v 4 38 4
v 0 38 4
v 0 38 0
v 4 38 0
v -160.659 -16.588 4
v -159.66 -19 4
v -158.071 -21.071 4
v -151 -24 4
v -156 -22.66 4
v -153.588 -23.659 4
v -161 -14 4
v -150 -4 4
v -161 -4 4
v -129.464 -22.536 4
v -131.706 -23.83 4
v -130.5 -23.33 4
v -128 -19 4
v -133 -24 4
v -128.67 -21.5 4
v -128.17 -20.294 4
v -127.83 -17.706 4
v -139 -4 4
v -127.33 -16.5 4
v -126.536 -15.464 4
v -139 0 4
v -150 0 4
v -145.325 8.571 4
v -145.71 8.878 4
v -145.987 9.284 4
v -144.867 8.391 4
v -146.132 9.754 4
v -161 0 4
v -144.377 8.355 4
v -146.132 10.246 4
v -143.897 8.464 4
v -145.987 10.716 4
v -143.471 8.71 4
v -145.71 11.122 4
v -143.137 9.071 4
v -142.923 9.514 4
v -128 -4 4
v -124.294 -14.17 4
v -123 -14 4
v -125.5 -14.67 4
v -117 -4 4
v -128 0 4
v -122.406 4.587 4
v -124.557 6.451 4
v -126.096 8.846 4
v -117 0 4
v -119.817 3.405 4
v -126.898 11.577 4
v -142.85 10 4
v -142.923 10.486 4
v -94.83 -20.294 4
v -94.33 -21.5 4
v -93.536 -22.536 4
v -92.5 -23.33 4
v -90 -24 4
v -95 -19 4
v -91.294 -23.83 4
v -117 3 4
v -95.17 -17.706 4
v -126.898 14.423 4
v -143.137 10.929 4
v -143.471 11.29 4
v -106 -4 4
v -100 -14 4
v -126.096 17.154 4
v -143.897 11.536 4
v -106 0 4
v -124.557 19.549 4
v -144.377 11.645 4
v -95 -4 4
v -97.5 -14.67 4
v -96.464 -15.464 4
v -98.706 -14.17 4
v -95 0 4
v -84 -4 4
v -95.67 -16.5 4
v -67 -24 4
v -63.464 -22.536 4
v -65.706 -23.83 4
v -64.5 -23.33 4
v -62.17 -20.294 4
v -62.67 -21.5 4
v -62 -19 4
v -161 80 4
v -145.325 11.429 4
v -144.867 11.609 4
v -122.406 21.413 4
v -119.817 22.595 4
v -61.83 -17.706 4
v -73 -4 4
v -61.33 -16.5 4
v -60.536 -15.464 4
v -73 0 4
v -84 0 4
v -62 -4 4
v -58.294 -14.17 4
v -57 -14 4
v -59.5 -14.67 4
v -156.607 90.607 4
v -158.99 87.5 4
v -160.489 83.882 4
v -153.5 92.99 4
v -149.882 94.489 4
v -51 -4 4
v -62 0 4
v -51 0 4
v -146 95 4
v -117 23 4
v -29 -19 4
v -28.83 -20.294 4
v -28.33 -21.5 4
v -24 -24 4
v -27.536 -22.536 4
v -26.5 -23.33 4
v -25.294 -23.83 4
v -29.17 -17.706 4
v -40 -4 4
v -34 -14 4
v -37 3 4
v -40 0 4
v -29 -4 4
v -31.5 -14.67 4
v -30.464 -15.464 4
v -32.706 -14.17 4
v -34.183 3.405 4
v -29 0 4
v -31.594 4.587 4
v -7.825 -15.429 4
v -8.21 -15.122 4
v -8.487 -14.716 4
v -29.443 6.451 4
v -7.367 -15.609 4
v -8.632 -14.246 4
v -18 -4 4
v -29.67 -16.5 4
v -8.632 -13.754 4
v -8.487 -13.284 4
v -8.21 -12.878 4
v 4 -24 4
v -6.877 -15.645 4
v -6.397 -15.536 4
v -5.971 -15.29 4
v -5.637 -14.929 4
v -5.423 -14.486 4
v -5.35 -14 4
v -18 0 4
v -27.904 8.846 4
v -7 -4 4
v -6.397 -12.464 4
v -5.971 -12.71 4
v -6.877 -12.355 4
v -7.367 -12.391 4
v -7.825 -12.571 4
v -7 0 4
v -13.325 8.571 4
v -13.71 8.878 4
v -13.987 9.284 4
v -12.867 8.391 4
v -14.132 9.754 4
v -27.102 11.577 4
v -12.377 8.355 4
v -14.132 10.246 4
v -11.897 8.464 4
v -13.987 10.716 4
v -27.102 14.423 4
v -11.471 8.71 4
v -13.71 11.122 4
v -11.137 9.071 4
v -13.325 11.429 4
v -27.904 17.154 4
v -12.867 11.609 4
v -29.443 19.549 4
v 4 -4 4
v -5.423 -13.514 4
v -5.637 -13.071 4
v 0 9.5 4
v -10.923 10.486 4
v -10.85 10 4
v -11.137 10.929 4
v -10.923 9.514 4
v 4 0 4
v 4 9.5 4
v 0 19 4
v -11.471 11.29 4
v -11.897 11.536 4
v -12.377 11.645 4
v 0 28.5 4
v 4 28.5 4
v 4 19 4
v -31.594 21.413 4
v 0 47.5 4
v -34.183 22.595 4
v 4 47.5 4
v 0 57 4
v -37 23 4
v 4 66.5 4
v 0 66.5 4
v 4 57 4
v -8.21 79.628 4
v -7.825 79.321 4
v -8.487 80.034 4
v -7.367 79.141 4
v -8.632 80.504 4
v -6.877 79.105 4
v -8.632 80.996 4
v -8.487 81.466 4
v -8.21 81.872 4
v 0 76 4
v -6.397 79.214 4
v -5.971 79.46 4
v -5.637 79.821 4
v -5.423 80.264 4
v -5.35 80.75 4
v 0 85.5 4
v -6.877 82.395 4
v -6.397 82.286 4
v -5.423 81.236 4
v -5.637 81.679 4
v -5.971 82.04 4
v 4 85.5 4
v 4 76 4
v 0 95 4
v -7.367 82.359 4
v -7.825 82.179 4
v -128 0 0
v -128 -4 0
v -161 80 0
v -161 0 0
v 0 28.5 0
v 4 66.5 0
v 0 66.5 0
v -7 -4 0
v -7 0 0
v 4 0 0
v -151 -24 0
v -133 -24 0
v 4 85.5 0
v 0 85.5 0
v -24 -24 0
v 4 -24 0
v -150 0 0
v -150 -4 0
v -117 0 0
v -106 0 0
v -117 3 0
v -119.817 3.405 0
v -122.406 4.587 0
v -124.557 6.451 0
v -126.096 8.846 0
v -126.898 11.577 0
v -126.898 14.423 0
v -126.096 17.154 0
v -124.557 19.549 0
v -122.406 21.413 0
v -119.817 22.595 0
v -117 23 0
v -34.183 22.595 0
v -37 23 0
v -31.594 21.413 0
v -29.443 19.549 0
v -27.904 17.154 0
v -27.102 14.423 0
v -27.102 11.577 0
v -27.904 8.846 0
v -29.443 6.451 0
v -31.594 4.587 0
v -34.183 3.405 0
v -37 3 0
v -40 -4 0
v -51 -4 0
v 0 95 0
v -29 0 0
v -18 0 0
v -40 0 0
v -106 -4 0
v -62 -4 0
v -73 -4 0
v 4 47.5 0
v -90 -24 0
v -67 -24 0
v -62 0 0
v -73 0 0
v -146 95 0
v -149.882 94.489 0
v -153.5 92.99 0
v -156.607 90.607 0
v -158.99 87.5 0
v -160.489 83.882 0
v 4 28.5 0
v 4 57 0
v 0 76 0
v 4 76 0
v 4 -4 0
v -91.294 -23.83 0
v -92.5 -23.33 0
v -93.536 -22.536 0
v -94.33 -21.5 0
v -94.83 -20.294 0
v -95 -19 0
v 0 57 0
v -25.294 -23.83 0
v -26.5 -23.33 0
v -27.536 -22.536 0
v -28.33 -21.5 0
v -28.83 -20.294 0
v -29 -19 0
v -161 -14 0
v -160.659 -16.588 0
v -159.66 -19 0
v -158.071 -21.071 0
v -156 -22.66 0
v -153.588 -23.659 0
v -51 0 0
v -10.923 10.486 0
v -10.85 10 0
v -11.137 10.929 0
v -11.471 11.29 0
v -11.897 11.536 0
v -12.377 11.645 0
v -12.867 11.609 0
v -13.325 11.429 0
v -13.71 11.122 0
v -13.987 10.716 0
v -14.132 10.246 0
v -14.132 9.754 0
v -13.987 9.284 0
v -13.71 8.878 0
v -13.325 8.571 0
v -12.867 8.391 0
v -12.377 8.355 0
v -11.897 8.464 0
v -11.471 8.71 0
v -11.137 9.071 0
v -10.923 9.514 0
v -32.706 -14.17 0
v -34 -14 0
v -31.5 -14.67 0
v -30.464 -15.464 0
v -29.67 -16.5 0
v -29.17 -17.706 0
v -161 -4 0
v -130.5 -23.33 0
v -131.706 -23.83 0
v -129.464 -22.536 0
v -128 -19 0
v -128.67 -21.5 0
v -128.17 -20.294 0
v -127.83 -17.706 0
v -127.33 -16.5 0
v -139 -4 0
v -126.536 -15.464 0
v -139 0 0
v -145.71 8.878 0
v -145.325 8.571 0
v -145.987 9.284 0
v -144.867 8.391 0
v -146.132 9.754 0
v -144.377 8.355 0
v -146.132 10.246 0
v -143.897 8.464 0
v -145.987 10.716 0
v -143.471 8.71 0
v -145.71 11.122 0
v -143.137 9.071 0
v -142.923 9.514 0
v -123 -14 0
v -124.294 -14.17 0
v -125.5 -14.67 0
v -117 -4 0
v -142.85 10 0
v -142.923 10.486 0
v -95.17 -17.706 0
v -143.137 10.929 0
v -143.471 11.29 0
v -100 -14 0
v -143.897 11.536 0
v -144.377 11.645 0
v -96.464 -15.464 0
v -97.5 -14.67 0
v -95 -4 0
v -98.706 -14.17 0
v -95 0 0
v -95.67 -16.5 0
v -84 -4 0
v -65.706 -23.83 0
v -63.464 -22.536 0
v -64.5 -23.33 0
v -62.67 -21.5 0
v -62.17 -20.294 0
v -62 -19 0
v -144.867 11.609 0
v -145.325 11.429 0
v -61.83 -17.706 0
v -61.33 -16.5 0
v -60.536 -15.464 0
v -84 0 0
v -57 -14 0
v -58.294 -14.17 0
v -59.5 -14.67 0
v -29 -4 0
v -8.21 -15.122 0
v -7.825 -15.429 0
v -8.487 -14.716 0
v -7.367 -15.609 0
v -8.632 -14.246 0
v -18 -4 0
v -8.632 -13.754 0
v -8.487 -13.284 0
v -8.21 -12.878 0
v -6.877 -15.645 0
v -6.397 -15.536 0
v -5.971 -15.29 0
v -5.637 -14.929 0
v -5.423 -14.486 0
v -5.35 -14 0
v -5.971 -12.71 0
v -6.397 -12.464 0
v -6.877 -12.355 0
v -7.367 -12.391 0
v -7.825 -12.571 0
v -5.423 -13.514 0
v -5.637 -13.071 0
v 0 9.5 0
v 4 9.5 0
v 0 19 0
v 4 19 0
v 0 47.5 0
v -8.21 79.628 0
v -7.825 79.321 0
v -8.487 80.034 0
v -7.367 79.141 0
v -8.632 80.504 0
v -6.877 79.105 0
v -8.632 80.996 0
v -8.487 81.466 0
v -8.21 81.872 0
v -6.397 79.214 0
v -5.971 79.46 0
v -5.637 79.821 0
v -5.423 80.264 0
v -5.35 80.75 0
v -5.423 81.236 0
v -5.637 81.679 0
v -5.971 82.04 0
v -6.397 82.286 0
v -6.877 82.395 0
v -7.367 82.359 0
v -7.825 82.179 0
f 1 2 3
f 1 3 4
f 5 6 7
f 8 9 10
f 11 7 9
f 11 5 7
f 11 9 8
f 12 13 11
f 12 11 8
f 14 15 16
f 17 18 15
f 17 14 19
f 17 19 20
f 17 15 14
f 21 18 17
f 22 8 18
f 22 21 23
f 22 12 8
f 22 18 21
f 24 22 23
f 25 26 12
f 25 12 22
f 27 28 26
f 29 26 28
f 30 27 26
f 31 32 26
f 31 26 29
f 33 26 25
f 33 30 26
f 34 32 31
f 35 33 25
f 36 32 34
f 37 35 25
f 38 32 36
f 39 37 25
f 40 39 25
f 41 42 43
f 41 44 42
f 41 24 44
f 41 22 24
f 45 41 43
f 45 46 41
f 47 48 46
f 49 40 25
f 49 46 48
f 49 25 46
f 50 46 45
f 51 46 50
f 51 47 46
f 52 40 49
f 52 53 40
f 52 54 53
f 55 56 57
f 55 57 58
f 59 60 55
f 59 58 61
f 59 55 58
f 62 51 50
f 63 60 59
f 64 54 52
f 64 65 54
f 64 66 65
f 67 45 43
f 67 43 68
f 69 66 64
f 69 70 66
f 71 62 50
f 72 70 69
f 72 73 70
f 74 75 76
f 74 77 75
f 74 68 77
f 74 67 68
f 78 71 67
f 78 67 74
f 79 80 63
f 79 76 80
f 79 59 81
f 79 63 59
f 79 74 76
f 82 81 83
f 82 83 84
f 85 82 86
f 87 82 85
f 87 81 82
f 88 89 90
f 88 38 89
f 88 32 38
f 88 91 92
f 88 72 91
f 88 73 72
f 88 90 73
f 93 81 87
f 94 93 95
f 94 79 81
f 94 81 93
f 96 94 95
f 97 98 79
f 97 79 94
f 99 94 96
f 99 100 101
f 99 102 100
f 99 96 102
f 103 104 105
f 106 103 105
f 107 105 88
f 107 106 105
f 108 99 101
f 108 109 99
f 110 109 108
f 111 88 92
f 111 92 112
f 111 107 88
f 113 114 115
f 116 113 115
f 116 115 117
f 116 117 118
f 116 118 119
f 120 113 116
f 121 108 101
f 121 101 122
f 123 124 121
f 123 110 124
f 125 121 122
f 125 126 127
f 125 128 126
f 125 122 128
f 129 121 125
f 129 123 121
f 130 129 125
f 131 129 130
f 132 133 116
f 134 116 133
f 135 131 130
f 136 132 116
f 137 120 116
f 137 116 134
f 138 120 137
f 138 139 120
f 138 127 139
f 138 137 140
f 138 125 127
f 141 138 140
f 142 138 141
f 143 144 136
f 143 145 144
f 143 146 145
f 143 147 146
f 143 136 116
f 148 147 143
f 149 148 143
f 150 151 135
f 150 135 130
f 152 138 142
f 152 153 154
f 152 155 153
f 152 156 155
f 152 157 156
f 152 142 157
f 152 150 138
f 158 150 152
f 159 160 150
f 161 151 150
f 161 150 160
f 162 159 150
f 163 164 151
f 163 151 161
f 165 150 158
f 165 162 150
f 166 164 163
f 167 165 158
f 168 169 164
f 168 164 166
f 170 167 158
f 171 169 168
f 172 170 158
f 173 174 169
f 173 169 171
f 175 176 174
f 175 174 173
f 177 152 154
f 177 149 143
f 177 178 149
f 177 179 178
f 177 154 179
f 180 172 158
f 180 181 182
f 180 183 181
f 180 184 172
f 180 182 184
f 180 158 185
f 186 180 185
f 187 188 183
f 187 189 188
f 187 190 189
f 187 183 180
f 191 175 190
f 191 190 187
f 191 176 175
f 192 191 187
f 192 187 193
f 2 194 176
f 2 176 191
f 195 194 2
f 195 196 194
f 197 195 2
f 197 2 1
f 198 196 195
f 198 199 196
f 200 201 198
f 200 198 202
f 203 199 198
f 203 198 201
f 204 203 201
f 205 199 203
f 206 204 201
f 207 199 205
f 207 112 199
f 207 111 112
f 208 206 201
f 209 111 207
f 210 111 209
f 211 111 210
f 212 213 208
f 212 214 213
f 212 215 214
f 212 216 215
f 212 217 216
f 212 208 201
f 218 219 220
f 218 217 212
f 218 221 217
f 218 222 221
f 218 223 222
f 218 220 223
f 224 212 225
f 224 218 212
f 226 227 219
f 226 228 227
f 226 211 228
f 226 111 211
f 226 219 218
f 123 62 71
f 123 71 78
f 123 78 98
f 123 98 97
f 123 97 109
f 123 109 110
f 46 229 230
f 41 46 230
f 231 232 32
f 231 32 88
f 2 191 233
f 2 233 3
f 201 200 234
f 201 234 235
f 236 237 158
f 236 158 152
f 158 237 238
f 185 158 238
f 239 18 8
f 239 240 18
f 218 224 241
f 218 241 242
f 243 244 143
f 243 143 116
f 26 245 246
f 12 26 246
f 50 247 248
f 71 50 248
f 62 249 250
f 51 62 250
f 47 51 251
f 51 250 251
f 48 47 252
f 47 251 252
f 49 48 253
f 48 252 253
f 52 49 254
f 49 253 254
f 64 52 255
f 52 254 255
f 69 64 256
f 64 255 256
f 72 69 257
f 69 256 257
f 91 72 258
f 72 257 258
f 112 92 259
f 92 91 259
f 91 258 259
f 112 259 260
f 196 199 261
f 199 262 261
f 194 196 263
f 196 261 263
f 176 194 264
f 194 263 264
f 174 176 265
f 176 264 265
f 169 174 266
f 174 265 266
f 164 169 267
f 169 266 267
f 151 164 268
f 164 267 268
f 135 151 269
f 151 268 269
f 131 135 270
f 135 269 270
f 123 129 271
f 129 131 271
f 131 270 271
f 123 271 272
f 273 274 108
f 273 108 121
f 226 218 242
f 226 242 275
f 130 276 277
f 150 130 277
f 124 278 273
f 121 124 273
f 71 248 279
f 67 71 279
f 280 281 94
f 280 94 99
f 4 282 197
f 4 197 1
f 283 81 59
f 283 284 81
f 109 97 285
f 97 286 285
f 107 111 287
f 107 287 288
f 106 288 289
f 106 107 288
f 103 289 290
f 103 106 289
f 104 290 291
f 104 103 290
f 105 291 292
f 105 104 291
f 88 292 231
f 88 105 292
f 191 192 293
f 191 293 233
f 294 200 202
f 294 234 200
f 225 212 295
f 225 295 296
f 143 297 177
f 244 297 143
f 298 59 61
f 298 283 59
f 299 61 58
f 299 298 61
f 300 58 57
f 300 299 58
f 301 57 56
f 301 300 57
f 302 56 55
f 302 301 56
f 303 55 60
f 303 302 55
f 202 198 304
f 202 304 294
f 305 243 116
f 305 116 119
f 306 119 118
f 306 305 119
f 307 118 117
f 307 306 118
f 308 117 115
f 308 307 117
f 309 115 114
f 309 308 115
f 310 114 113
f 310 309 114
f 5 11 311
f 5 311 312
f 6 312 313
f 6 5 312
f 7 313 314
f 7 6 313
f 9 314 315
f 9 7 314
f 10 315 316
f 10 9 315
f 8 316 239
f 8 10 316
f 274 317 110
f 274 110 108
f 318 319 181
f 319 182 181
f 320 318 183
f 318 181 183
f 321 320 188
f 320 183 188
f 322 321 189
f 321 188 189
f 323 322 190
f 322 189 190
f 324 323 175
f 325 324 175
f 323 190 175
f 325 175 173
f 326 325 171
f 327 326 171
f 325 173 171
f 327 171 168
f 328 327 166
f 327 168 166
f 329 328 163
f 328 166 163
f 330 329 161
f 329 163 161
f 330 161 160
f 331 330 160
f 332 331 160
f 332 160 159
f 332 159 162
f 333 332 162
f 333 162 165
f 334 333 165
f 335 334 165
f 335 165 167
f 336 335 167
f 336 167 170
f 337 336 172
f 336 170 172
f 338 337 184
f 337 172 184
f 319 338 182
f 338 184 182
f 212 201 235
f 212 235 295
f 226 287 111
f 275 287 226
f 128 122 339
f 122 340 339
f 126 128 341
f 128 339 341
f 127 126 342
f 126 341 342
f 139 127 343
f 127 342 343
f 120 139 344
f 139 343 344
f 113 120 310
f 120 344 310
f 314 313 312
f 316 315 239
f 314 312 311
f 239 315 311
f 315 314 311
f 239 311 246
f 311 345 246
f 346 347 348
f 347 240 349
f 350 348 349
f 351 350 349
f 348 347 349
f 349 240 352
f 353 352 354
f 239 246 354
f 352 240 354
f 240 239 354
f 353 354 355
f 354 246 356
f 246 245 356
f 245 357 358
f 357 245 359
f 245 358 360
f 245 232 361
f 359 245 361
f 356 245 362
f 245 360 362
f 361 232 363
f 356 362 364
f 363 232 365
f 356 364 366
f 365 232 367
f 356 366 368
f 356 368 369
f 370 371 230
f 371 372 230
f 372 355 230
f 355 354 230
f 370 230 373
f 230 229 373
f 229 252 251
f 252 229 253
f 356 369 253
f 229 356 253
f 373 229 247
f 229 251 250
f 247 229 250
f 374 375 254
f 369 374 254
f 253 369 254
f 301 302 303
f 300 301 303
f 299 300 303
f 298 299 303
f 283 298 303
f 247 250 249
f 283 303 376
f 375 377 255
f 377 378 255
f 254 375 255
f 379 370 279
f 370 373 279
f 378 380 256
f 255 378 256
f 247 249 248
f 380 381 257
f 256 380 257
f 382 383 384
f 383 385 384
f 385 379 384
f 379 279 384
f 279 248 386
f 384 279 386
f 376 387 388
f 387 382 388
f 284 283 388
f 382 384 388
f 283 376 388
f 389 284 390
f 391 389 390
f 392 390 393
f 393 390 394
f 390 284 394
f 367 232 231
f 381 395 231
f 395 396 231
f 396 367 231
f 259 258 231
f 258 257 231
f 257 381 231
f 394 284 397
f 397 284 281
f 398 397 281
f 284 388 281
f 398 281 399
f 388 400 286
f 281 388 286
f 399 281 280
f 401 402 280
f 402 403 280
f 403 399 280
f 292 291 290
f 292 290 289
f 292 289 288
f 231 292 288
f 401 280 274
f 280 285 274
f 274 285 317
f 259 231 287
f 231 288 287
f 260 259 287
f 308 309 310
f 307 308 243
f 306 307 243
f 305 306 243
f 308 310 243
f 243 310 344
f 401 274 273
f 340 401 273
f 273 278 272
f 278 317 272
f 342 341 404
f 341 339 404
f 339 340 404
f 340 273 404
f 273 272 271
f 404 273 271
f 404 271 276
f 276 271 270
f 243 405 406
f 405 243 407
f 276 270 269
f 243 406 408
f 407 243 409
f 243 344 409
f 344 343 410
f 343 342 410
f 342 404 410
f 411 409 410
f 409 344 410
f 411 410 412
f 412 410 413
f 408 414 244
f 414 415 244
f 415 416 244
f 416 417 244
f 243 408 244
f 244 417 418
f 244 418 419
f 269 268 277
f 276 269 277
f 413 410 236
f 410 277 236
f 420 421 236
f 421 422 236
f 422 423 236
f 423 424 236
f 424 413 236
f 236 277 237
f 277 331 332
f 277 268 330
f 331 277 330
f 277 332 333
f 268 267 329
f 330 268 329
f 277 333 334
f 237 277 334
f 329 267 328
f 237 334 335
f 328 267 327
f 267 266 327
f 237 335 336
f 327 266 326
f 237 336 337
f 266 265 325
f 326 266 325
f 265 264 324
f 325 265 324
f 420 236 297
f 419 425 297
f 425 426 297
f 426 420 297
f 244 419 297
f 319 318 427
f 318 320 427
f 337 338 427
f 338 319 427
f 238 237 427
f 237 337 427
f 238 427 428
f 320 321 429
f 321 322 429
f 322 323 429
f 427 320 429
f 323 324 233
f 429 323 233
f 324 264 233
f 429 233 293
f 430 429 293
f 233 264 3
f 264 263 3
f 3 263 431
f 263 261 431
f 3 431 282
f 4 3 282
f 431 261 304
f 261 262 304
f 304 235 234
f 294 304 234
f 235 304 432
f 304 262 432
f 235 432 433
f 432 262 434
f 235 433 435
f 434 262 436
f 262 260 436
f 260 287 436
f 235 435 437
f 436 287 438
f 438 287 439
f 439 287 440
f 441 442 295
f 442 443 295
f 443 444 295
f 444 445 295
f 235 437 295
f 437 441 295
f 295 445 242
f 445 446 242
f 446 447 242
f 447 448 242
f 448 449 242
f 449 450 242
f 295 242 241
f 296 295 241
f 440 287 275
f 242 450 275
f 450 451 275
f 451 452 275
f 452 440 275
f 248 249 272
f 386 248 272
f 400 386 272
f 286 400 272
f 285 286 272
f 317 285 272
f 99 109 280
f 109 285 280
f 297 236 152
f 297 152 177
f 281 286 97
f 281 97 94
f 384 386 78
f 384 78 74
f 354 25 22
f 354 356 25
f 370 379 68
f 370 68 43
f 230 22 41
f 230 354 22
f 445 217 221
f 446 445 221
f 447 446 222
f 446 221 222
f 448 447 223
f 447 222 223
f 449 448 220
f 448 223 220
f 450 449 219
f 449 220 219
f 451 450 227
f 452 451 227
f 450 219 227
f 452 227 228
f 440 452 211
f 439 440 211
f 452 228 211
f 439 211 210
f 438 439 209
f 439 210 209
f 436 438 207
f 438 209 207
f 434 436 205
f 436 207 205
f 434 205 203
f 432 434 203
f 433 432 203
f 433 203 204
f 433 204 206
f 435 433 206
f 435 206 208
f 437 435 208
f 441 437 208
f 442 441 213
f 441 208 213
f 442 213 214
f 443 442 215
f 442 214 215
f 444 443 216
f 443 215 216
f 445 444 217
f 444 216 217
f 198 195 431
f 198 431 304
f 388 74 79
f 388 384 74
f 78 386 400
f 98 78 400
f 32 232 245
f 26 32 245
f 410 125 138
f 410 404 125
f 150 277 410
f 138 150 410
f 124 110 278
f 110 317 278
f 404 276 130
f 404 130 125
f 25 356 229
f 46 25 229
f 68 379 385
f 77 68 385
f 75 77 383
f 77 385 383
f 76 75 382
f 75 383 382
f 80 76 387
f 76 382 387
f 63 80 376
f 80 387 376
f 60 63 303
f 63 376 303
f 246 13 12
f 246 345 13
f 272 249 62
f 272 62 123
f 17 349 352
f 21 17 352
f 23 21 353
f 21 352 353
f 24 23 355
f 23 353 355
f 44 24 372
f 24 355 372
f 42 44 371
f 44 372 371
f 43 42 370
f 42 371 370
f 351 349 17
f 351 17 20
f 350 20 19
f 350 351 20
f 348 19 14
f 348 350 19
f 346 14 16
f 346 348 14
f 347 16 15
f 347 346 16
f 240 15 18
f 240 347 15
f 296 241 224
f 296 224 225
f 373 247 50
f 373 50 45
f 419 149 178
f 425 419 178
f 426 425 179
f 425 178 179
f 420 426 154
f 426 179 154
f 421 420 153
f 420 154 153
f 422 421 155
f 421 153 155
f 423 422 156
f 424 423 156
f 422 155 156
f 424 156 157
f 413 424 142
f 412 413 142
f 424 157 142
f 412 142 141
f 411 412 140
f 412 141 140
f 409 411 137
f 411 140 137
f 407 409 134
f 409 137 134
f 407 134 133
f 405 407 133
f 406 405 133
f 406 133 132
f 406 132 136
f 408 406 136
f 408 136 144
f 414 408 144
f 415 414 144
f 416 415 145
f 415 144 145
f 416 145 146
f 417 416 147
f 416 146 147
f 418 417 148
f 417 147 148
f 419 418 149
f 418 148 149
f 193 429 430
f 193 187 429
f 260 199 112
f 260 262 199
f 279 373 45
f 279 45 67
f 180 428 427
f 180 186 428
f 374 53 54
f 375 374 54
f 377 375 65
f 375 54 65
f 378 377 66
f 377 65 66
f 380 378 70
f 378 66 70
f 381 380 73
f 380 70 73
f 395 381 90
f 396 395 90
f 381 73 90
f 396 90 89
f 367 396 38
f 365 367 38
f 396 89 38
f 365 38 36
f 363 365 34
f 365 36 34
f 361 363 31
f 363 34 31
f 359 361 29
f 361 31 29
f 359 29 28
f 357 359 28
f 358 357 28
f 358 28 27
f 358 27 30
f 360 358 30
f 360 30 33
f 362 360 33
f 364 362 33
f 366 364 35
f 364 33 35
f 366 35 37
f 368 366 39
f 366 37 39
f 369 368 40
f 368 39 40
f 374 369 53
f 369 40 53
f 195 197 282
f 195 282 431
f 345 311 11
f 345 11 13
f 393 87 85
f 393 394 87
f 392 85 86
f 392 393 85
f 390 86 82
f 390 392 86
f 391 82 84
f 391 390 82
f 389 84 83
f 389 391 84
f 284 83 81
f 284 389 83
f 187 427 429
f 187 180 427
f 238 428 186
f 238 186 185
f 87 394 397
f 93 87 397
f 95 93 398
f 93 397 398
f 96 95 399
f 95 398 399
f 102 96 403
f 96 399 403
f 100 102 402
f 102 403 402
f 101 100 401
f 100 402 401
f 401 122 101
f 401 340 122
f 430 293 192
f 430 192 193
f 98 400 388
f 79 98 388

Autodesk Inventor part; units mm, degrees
ref_plane "YZ Plane" through (0, 0, 0) normal (1, 0, 0) x (0, 1, 0)
ref_plane "XZ Plane" through (0, 0, 0) normal (0, 1, 0) x (-1, 0, 0)
ref_plane "XY Plane" through (0, 0, 0) normal (0, 0, 1) x (1, 0, 0)
sketch "Schizzo1" plane through (0, 0, 0) normal (0, 0, 1) x (1, 0, 0)
  line L0 (4, 17) -> (0, 17) construction
  line L1 (0, 17) -> (0, 95) construction
  line L2 (0, 95) -> (4, 95) construction
  line L3 (4, 95) -> (4, 17) construction
  line L4 (4, -4) -> (4, -24) construction
  line L5 (4, -24) -> (0, -24) construction
  line L6 (0, -24) -> (0, -4) construction
  line L7 (0, 0) -> (0, 11) construction
  line L8 (0, 11) -> (4, 11) construction
  line L9 (4, 11) -> (4, 0) construction
  line L10 (-161, -24) -> (-161, 95)
  line L11 (-161, 95) -> (4, 95)
  line L12 (4, 95) -> (4, -24)
  line L13 (-133, -24) -> (-161, -24)
  arc A0 (-133, -24) -> (-128, -19) centre (-133, -19) ccw
  arc A1 (-123, -14) -> (-128, -19) centre (-123, -19) ccw
  line L14 (-100, -14) -> (-123, -14)
  arc A2 (-95, -19) -> (-100, -14) centre (-100, -19) ccw
  arc A3 (-95, -19) -> (-90, -24) centre (-90, -19) ccw
  line L15 (-67, -24) -> (-90, -24)
  arc A4 (-67, -24) -> (-62, -19) centre (-67, -19) ccw
  arc A5 (-57, -14) -> (-62, -19) centre (-57, -19) ccw
  line L16 (-34, -14) -> (-57, -14)
  arc A6 (-29, -19) -> (-34, -14) centre (-34, -19) ccw
  arc A7 (-29, -19) -> (-24, -24) centre (-24, -19) ccw
  line L17 (4, -24) -> (-24, -24)
  line L18 (-117, 13) -> (-37, 13) construction
  line L19 (-117, 3) -> (-37, 3)
  line L20 (-37, 23) -> (-117, 23)
  arc A8 (-117, 23) -> (-117, 3) centre (-117, 13) ccw
  arc A9 (-37, 3) -> (-37, 23) centre (-37, 13) ccw
  line L21 (-161, -4) -> (-150, -4) projected
  line L22 (-150, 0) -> (-150, -4) projected
  line L23 (-139, -4) -> (-128, -4) projected
  line L24 (-128, 0) -> (-128, -4) projected
  line L25 (-139, 0) -> (-128, 0) projected
  line L26 (-139, 0) -> (-139, -4) projected
  line L27 (-117, -4) -> (-106, -4) projected
  line L28 (-106, 0) -> (-106, -4) projected
  line L29 (-117, 0) -> (-106, 0) projected
  line L30 (-117, 0) -> (-117, -4) projected
  line L31 (-95, -4) -> (-84, -4) projected
  line L32 (-84, 0) -> (-84, -4) projected
  line L33 (-95, 0) -> (-84, 0) projected
  line L34 (-95, 0) -> (-95, -4) projected
  line L35 (-73, -4) -> (-62, -4) projected
  line L36 (-62, 0) -> (-62, -4) projected
  line L37 (-73, 0) -> (-62, 0) projected
  line L38 (-73, 0) -> (-73, -4) projected
  line L39 (-51, -4) -> (-40, -4) projected
  line L40 (-40, 0) -> (-40, -4) projected
  line L41 (-51, 0) -> (-40, 0) projected
  line L42 (-51, 0) -> (-51, -4) projected
  line L43 (-29, -4) -> (-18, -4) projected
  line L44 (-18, 0) -> (-18, -4) projected
  line L45 (-29, 0) -> (-18, 0) projected
  line L46 (-29, 0) -> (-29, -4) projected
  line L47 (-7, -4) -> (4, -4) projected
  line L48 (4, 0) -> (4, -4) projected
  line L49 (-7, 0) -> (4, 0) projected
  line L50 (-7, 0) -> (-7, -4) projected
  line L51 (-161, 0) -> (-150, 0) projected
  line L52 (-161, 0) -> (-161, -4) projected
  point P0 (-77, 13)
  dimension "d0" = 80
extrude "Estrusione1" add sketch "Schizzo1" along normal blind 4 contours L10 L21 L22 L51 L11 L12 L49 L50 L47 L17 A7 A6 L16 A5 A4 L15 A3 A2 L14 A1 A0 L13
sketch "Schizzo2" plane through (0, 0, 4) normal (0, 0, 1) x (1, 0, 0)
  line L0 (0, 76) -> (4, 76)
  line L1 (4, 76) -> (4, 66.5)
  line L2 (4, 66.5) -> (0, 66.5)
  line L3 (0, 66.5) -> (0, 76)
  line L4 (4, 85.5) -> (0, 85.5)
  line L5 (0, 85.5) -> (0, 95)
  line L6 (0, 95) -> (4, 95)
  line L7 (4, 95) -> (4, 85.5)
  line L8 (0, 38) -> (4, 38)
  line L9 (4, 38) -> (4, 28.5)
  line L10 (4, 28.5) -> (0, 28.5)
  line L11 (0, 28.5) -> (0, 38)
  line L12 (4, 47.5) -> (0, 47.5)
  line L13 (0, 47.5) -> (0, 57)
  line L14 (0, 57) -> (4, 57)
  line L15 (4, 57) -> (4, 47.5)
  line L16 (4, 9.5) -> (0, 9.5)
  line L17 (0, 9.5) -> (0, 19)
  line L18 (0, 19) -> (4, 19)
  line L19 (4, 19) -> (4, 9.5)
  point P0 (0, 0)
extrude "Estrusione2" cut sketch "Schizzo2" against normal blind 4
fillet "Raccordo1" radius 15 1 edges at (-161, 95, 2)
fillet "Raccordo2" radius 10 1 edges at (-161, -24, 2)
sketch "Schizzo3" plane through (0, 0, 4) normal (0, 0, 1) x (1, 0, 0)
  line L0 (-146.15, 0) -> (-142.85, 0) projected
  line L1 (-14.15, 0) -> (-10.85, 0) projected
  line L2 (-144.5, 0) -> (-144.5, 10) construction
  circle A0 centre (-144.5, 10) radius 1.65
  line L3 (-12.5, 0) -> (-12.5, 10) construction
  circle A1 centre (-12.5, 10) radius 1.65
  line L4 (0, 79.1) -> (0, 82.4) construction
  line L5 (0, -15.65) -> (0, -12.35) construction
  line L6 (0, -14) -> (-7, -14) construction
  line L7 (0, 80.75) -> (-7, 80.75) construction
  circle A2 centre (-7, 80.75) radius 1.65
  circle A3 centre (-7, -14) radius 1.65
  point P0 (0, 0)
  dimension "d7" = 10
  dimension "d8" = 3.3
  dimension "d9" = 10
  dimension "d10" = 3.3
  dimension "d13" = 7
  dimension "d14" = 7
  dimension "d15" = 3.3
  dimension "d16" = 3.3
extrude "Estrusione3" cut sketch "Schizzo3" against normal blind 4
properties part number "LatoPy"
